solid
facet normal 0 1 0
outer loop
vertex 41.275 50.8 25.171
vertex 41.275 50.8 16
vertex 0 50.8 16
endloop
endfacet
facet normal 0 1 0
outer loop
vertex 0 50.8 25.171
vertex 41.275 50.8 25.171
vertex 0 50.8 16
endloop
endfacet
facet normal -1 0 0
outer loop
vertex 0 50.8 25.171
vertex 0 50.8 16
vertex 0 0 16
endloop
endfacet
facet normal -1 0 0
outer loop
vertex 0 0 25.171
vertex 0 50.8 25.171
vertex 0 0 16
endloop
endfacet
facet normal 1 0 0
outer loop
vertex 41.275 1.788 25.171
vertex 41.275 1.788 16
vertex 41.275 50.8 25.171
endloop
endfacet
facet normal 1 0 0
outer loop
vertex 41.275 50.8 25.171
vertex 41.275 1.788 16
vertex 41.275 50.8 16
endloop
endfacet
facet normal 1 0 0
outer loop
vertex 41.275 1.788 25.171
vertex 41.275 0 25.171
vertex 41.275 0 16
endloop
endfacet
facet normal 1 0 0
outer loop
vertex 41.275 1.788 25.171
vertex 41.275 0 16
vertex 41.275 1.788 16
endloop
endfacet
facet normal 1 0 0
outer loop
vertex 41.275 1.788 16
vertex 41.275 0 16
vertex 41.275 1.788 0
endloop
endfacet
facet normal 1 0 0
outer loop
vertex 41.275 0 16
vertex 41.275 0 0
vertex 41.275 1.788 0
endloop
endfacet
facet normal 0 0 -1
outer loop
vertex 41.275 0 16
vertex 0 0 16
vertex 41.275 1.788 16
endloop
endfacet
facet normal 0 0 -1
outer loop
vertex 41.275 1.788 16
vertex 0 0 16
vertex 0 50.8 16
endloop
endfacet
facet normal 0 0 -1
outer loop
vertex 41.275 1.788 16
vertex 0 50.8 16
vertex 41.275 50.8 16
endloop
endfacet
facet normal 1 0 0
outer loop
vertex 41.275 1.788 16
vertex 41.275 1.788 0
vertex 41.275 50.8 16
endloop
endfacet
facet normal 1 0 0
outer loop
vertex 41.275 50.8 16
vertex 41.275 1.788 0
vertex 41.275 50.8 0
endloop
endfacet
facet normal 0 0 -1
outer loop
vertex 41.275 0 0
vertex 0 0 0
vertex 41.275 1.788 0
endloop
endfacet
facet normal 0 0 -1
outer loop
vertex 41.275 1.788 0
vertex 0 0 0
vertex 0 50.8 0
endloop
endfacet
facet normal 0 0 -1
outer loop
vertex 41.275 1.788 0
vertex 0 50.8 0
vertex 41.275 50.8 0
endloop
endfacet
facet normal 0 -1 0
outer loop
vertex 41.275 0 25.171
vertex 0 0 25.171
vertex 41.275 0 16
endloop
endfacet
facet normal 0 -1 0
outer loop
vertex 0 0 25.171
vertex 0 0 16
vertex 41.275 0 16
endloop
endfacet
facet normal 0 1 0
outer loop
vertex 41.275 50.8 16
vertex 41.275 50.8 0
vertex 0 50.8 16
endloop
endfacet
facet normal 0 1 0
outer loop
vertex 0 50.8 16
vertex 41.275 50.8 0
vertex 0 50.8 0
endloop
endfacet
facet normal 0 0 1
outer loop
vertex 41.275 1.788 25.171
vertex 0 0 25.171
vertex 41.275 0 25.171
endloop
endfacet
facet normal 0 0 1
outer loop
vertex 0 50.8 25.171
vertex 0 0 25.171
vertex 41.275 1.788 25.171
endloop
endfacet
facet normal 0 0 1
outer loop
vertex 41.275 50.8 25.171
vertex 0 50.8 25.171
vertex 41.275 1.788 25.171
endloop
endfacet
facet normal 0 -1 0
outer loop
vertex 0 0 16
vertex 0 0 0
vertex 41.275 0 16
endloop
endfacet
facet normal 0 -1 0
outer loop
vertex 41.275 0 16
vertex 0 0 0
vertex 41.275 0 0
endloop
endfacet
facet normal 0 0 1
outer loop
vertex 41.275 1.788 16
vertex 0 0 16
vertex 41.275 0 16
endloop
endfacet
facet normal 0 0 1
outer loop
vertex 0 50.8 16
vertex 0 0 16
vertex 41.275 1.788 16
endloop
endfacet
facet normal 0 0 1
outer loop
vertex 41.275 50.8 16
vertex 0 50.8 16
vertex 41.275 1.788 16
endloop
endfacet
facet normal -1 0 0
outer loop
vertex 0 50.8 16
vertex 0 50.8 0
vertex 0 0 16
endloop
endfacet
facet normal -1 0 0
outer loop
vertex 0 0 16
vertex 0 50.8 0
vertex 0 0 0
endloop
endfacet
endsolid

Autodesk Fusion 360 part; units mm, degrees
sketch "Stock" plane through (0, 0, 0) normal (0, 0, 1) x (1, 0, 0)
  line L0 (0, 0) -> (41.275, 0)
  line L1 (41.275, 0) -> (41.275, 50.8)
  line L2 (41.275, 50.8) -> (0, 50.8)
  line L3 (0, 50.8) -> (0, 0)
  line L4 (44.45, 1.7875) -> (44.45, 51)
  arc A0 (44.45, 51) -> (41.275, 51) centre (42.8625, 51) ccw
  line L5 (41.275, 51) -> (41.275, 1.7875)
  arc A1 (41.275, 1.7875) -> (44.45, 1.7875) centre (42.8625, 1.7875) ccw
  line L6 (42.8625, 0.2) -> (42.8625, 52.5875) construction
  line L7 (41.275, 51) -> (41.275, -0.2)
  arc A2 (41.275, -0.2) -> (44.45, -0.2) centre (42.8625, -0.2) ccw
  line L8 (44.45, -0.2) -> (44.45, 51)
  arc A3 (44.45, 51) -> (41.275, 51) centre (42.8625, 51) ccw
  line L9 (42.8625, 52.5875) -> (42.8625, -1.7875) construction
  line L10 (44.45, 53.1813) -> (-2.3813, 53.1813)
  line L11 (-2.3812, 53.1813) -> (-2.3813, -2.3813)
  line L12 (-2.3813, -2.3813) -> (44.45, -2.3813)
  line L13 (44.45, -2.3813) -> (44.45, 53.1813)
  line L14 (0, 25.4) -> (41.275, 25.4) construction
  dimension "d5" = 41.275
  dimension "d6" = 50.8
  dimension "d13" = 3.175
  dimension "d14" = 0.2
  dimension "d15" = 0.2
  dimension "d16" = 0.2
  dimension "d22" = 2.3813
  dimension "d23" = 2.3813
extrude "Extrude1" add sketch "Stock" along normal blind 25.1714 contours L0 L1 L2 L3 L5 L7 makes body 1
ref_plane "WorkPlane1" through (20.6375, 25.4, 16) normal (0, 0, 1) x (1, 0, 0)
split "Split1" by plane through (20.6375, 25.4, 16) normal (0, 0, 1) bodies 1 makes body 2 at (13.7583, 17.5292, 16)
equation "STOCK_Y = 2 in"
equation "STOCK_X = 1.625 in"
equation "STOCK_Z = 0.991 in"
equation "ENDMILL_DIAMETER = 0.125 in"
equation "d5 = STOCK_X"
equation "d6 = STOCK_Y"
equation "d10 = STOCK_Z"
equation "d13 = ENDMILL_DIAMETER"
equation "CORNER_HEIGHT = 6 mm"
equation "ENDMILL_LENGTH = 18 in"
equation "CUT_DEPTH = min(ENDMILL_LENGTH; STOCK_Z / 2)"
equation "FACE_Z = 16 mm"
equation "d21 = FACE_Z"
equation "d22 = ENDMILL_DIAMETER * 0.75"
equation "d23 = ENDMILL_DIAMETER * 0.75"
properties part number "1.625x2y-16"
